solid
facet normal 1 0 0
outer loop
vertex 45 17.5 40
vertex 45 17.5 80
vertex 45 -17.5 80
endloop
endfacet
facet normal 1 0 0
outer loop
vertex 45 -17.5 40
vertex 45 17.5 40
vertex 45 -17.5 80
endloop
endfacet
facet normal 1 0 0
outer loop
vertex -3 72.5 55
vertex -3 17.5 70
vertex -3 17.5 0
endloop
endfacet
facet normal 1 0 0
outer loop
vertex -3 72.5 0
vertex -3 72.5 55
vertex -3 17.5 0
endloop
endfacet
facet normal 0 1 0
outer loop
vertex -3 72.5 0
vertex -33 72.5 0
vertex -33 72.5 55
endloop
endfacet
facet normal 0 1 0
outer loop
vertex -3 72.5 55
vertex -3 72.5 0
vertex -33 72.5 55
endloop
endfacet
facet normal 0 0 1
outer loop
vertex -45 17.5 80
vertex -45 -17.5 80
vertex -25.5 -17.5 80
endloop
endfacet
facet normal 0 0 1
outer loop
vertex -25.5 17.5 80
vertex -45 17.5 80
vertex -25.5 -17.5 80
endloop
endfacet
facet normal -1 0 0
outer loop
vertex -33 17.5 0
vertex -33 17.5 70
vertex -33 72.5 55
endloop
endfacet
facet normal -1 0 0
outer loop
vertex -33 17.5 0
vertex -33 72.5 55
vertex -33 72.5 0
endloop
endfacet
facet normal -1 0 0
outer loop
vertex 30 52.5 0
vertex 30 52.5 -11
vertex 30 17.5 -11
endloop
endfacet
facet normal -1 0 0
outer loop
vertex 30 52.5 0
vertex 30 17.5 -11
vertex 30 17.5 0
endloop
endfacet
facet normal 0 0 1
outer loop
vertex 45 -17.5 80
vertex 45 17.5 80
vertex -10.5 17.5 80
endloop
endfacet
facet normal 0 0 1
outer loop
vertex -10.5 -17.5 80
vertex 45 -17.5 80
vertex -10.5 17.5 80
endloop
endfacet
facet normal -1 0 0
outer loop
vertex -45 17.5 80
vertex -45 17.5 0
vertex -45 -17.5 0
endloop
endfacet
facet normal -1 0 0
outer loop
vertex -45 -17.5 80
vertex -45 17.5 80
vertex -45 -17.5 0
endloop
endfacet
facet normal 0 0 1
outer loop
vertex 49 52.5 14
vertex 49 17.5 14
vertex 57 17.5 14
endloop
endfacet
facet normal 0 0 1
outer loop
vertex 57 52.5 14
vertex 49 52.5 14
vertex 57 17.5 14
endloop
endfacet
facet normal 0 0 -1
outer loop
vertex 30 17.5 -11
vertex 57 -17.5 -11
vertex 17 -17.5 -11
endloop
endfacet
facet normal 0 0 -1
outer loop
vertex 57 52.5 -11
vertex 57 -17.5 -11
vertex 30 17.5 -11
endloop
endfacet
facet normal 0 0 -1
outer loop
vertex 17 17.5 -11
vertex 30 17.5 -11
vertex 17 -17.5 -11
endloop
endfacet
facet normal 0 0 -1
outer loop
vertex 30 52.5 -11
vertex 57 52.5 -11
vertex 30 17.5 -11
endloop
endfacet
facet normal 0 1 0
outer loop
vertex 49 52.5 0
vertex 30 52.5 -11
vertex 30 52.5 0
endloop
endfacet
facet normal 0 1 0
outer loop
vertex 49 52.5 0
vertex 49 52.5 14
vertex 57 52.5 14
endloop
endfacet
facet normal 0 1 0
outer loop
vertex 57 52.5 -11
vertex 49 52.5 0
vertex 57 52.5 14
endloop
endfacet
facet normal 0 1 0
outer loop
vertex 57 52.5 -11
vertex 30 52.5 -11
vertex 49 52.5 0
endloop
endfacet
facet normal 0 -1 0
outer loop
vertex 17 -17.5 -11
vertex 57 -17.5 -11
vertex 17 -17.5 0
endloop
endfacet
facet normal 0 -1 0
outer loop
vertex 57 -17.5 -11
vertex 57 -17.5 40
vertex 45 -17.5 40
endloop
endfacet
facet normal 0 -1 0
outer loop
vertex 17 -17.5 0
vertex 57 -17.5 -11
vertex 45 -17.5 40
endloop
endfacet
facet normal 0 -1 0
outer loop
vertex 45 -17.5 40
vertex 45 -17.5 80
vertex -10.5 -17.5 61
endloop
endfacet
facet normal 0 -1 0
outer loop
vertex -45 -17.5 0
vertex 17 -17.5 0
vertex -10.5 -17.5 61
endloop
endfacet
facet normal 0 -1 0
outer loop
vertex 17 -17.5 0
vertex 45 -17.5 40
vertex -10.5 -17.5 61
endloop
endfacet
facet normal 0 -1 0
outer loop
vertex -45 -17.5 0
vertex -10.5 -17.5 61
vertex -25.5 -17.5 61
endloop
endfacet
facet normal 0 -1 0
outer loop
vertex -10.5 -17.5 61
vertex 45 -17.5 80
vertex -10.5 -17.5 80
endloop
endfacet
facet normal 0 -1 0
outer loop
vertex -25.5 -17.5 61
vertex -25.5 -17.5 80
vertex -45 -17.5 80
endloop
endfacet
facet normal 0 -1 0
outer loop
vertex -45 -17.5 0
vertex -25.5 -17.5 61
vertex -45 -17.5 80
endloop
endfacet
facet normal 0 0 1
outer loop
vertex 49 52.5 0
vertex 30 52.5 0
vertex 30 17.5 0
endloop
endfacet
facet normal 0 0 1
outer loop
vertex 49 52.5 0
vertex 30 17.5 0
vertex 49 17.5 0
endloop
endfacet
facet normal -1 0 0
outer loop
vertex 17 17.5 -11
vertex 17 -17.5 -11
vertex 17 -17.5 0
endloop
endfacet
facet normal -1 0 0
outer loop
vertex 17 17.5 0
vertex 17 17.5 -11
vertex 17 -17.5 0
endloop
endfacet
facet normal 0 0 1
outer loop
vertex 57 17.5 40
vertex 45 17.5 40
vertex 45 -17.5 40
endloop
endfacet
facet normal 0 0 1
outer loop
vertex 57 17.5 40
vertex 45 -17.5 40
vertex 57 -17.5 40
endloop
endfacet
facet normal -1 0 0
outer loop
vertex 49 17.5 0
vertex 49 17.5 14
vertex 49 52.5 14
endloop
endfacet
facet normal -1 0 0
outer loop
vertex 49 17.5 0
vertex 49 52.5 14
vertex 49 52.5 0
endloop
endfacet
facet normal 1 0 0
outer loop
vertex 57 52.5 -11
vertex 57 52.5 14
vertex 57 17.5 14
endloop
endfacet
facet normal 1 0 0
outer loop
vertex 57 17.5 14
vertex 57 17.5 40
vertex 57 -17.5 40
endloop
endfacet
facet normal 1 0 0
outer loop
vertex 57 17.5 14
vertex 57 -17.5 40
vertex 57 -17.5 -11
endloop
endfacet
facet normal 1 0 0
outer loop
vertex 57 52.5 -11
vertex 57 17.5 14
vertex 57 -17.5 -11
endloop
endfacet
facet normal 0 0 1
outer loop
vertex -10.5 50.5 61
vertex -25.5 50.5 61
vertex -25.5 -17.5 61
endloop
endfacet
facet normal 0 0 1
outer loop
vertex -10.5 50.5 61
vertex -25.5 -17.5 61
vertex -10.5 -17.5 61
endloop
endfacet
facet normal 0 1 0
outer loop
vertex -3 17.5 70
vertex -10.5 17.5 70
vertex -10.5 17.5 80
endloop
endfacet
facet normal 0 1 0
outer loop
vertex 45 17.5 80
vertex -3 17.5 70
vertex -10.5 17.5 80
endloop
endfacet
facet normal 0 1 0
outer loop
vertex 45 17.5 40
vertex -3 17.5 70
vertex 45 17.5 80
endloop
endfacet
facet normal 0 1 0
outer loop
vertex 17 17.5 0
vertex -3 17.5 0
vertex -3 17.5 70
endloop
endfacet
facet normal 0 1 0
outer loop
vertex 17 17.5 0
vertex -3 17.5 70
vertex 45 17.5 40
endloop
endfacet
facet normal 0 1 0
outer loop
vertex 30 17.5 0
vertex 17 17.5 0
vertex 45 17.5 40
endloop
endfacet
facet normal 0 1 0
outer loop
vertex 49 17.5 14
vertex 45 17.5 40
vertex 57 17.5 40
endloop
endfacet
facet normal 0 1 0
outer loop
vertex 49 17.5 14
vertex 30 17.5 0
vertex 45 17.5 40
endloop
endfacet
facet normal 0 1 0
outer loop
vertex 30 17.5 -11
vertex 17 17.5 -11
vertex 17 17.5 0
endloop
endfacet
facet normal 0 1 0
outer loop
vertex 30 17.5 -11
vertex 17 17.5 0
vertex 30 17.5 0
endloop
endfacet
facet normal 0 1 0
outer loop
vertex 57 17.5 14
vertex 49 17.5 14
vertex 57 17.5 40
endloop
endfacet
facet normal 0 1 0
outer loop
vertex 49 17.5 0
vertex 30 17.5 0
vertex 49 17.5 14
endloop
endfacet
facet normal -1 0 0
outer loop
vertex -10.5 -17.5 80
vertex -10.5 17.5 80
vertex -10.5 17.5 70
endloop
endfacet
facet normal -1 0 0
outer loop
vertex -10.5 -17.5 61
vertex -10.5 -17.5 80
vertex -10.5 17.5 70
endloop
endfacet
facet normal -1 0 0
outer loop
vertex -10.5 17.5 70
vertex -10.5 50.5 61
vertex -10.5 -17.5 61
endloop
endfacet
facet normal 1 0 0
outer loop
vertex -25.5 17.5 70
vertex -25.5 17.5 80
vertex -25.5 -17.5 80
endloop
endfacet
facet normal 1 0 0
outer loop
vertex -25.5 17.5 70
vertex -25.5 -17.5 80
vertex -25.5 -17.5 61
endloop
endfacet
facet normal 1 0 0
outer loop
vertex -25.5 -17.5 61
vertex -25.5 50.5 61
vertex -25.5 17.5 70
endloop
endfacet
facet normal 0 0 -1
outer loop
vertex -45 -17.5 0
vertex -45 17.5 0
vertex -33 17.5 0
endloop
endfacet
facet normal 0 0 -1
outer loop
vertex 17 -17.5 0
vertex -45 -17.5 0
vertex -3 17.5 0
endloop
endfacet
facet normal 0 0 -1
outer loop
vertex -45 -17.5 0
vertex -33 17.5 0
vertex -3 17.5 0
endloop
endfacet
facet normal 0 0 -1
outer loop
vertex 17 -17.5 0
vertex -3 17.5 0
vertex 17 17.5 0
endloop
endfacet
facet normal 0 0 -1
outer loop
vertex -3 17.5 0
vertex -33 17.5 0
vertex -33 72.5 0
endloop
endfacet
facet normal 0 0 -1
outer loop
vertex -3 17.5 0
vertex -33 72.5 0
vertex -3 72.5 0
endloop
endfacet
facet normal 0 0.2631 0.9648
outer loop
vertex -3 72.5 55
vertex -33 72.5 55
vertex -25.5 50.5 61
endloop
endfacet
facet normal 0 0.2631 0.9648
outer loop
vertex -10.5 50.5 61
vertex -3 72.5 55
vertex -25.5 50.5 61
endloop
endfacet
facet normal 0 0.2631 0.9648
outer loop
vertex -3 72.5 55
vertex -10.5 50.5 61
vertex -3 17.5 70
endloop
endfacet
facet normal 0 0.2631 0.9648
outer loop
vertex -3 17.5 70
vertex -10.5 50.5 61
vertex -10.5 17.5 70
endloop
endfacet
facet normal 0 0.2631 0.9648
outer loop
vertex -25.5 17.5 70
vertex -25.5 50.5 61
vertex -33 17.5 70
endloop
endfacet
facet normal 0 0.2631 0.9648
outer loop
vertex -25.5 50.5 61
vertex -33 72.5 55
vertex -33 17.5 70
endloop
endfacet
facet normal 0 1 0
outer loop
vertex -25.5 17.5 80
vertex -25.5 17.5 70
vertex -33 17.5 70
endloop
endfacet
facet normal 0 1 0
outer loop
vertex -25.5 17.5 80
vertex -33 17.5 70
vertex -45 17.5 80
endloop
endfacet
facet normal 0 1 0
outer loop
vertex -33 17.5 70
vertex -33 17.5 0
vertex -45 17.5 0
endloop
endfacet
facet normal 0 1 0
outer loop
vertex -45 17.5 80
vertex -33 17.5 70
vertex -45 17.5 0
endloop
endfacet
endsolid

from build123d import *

# Parameters (mm, degrees)
EXTRUDE_1_DEPTH     = 80
EXTRUDE_START       = -12
EXTRUDE_2_DEPTH     = 30
SKETCH_3_W          = 15
SKETCH_3_H          = 19
CUT_EXTRUDE_1_DEPTH = 129.549601322
SKETCH_4_W          = 12
SKETCH_4_H          = 26
SKETCH_4_W_2        = 13
SKETCH_4_H_2        = 11
EXTRUDE_3_DEPTH     = 35
EXTRUDE_4_DEPTH     = 35
SKETCH_5_W          = 4
SKETCH_5_H          = 14
CUT_EXTRUDE_2_DEPTH = 35
EXTRUDE_5_DEPTH     = 40


with BuildPart() as part:
    # Эскиз1 → Бобышка-Вытянуть1 (new body)
    with BuildSketch(Plane.XY):
        Polygon((-45, -17.5), (30, -17.5), (45, 17.5), (-45, 17.5), align=None)
    extrude(amount=EXTRUDE_1_DEPTH)

    # Эскиз2 → Бобышка-Вытянуть2 (add)
    with BuildSketch(Plane.ZY.offset(45).offset(EXTRUDE_START)):
        Polygon((0, 17.5), (0, 72.5), (55, 72.5), (70, 17.5), align=None)
    extrude(amount=-EXTRUDE_2_DEPTH)

    # Эскиз3 → Вырез-Вытянуть1 (cut, through all)
    with BuildSketch(Plane(origin=(0, 72.5, 0), x_dir=(1, 0, 0), z_dir=(0, 1, 0))):
        with Locations((-18, -70.5)):
            Rectangle(SKETCH_3_W, SKETCH_3_H)
    extrude(amount=-CUT_EXTRUDE_1_DEPTH, mode=Mode.SUBTRACT)

    # Эскиз4 → Бобышка-Вытянуть3 (add)
    with BuildSketch(Plane(origin=(0, 17.5, 0), x_dir=(1, 0, 0), z_dir=(0, 1, 0))):
        Polygon((17, 0), (17, -40), (45, -40), (45, -14), (45, 0), (30, 0), align=None)
        with Locations((51, -27)):
            Rectangle(SKETCH_4_W, SKETCH_4_H)
        Polygon((45, 0), (45, -14), (57, -14), (57, 11), (30, 11), (30, 0), align=None)
        with Locations((23.5, 5.5)):
            Rectangle(SKETCH_4_W_2, SKETCH_4_H_2)
    extrude(amount=-EXTRUDE_3_DEPTH)

    # Эскиз4<3> → Бобышка-Вытянуть4 (add)
    with BuildSketch(Plane(origin=(0, 17.5, 0), x_dir=(1, 0, 0), z_dir=(0, 1, 0))):
        Polygon((45, 0), (45, -14), (57, -14), (57, 11), (30, 11), (30, 0), align=None)
    extrude(amount=EXTRUDE_4_DEPTH)

    # Эскиз5 → Вырез-Вытянуть2 (cut)
    with BuildSketch(Plane(origin=(0, 52.5, 0), x_dir=(1, 0, 0), z_dir=(0, 1, 0))):
        with Locations((47, -7)):
            Rectangle(SKETCH_5_W, SKETCH_5_H)
    extrude(amount=-CUT_EXTRUDE_2_DEPTH, mode=Mode.SUBTRACT)

    # Эскиз6 → Бобышка-Вытянуть5 (add)
    with BuildSketch(Plane.XY.offset(80)):
        Polygon((30, -17.5), (45, 17.5), (45, -17.5), align=None)
    extrude(amount=-EXTRUDE_5_DEPTH)


solid = part.part
